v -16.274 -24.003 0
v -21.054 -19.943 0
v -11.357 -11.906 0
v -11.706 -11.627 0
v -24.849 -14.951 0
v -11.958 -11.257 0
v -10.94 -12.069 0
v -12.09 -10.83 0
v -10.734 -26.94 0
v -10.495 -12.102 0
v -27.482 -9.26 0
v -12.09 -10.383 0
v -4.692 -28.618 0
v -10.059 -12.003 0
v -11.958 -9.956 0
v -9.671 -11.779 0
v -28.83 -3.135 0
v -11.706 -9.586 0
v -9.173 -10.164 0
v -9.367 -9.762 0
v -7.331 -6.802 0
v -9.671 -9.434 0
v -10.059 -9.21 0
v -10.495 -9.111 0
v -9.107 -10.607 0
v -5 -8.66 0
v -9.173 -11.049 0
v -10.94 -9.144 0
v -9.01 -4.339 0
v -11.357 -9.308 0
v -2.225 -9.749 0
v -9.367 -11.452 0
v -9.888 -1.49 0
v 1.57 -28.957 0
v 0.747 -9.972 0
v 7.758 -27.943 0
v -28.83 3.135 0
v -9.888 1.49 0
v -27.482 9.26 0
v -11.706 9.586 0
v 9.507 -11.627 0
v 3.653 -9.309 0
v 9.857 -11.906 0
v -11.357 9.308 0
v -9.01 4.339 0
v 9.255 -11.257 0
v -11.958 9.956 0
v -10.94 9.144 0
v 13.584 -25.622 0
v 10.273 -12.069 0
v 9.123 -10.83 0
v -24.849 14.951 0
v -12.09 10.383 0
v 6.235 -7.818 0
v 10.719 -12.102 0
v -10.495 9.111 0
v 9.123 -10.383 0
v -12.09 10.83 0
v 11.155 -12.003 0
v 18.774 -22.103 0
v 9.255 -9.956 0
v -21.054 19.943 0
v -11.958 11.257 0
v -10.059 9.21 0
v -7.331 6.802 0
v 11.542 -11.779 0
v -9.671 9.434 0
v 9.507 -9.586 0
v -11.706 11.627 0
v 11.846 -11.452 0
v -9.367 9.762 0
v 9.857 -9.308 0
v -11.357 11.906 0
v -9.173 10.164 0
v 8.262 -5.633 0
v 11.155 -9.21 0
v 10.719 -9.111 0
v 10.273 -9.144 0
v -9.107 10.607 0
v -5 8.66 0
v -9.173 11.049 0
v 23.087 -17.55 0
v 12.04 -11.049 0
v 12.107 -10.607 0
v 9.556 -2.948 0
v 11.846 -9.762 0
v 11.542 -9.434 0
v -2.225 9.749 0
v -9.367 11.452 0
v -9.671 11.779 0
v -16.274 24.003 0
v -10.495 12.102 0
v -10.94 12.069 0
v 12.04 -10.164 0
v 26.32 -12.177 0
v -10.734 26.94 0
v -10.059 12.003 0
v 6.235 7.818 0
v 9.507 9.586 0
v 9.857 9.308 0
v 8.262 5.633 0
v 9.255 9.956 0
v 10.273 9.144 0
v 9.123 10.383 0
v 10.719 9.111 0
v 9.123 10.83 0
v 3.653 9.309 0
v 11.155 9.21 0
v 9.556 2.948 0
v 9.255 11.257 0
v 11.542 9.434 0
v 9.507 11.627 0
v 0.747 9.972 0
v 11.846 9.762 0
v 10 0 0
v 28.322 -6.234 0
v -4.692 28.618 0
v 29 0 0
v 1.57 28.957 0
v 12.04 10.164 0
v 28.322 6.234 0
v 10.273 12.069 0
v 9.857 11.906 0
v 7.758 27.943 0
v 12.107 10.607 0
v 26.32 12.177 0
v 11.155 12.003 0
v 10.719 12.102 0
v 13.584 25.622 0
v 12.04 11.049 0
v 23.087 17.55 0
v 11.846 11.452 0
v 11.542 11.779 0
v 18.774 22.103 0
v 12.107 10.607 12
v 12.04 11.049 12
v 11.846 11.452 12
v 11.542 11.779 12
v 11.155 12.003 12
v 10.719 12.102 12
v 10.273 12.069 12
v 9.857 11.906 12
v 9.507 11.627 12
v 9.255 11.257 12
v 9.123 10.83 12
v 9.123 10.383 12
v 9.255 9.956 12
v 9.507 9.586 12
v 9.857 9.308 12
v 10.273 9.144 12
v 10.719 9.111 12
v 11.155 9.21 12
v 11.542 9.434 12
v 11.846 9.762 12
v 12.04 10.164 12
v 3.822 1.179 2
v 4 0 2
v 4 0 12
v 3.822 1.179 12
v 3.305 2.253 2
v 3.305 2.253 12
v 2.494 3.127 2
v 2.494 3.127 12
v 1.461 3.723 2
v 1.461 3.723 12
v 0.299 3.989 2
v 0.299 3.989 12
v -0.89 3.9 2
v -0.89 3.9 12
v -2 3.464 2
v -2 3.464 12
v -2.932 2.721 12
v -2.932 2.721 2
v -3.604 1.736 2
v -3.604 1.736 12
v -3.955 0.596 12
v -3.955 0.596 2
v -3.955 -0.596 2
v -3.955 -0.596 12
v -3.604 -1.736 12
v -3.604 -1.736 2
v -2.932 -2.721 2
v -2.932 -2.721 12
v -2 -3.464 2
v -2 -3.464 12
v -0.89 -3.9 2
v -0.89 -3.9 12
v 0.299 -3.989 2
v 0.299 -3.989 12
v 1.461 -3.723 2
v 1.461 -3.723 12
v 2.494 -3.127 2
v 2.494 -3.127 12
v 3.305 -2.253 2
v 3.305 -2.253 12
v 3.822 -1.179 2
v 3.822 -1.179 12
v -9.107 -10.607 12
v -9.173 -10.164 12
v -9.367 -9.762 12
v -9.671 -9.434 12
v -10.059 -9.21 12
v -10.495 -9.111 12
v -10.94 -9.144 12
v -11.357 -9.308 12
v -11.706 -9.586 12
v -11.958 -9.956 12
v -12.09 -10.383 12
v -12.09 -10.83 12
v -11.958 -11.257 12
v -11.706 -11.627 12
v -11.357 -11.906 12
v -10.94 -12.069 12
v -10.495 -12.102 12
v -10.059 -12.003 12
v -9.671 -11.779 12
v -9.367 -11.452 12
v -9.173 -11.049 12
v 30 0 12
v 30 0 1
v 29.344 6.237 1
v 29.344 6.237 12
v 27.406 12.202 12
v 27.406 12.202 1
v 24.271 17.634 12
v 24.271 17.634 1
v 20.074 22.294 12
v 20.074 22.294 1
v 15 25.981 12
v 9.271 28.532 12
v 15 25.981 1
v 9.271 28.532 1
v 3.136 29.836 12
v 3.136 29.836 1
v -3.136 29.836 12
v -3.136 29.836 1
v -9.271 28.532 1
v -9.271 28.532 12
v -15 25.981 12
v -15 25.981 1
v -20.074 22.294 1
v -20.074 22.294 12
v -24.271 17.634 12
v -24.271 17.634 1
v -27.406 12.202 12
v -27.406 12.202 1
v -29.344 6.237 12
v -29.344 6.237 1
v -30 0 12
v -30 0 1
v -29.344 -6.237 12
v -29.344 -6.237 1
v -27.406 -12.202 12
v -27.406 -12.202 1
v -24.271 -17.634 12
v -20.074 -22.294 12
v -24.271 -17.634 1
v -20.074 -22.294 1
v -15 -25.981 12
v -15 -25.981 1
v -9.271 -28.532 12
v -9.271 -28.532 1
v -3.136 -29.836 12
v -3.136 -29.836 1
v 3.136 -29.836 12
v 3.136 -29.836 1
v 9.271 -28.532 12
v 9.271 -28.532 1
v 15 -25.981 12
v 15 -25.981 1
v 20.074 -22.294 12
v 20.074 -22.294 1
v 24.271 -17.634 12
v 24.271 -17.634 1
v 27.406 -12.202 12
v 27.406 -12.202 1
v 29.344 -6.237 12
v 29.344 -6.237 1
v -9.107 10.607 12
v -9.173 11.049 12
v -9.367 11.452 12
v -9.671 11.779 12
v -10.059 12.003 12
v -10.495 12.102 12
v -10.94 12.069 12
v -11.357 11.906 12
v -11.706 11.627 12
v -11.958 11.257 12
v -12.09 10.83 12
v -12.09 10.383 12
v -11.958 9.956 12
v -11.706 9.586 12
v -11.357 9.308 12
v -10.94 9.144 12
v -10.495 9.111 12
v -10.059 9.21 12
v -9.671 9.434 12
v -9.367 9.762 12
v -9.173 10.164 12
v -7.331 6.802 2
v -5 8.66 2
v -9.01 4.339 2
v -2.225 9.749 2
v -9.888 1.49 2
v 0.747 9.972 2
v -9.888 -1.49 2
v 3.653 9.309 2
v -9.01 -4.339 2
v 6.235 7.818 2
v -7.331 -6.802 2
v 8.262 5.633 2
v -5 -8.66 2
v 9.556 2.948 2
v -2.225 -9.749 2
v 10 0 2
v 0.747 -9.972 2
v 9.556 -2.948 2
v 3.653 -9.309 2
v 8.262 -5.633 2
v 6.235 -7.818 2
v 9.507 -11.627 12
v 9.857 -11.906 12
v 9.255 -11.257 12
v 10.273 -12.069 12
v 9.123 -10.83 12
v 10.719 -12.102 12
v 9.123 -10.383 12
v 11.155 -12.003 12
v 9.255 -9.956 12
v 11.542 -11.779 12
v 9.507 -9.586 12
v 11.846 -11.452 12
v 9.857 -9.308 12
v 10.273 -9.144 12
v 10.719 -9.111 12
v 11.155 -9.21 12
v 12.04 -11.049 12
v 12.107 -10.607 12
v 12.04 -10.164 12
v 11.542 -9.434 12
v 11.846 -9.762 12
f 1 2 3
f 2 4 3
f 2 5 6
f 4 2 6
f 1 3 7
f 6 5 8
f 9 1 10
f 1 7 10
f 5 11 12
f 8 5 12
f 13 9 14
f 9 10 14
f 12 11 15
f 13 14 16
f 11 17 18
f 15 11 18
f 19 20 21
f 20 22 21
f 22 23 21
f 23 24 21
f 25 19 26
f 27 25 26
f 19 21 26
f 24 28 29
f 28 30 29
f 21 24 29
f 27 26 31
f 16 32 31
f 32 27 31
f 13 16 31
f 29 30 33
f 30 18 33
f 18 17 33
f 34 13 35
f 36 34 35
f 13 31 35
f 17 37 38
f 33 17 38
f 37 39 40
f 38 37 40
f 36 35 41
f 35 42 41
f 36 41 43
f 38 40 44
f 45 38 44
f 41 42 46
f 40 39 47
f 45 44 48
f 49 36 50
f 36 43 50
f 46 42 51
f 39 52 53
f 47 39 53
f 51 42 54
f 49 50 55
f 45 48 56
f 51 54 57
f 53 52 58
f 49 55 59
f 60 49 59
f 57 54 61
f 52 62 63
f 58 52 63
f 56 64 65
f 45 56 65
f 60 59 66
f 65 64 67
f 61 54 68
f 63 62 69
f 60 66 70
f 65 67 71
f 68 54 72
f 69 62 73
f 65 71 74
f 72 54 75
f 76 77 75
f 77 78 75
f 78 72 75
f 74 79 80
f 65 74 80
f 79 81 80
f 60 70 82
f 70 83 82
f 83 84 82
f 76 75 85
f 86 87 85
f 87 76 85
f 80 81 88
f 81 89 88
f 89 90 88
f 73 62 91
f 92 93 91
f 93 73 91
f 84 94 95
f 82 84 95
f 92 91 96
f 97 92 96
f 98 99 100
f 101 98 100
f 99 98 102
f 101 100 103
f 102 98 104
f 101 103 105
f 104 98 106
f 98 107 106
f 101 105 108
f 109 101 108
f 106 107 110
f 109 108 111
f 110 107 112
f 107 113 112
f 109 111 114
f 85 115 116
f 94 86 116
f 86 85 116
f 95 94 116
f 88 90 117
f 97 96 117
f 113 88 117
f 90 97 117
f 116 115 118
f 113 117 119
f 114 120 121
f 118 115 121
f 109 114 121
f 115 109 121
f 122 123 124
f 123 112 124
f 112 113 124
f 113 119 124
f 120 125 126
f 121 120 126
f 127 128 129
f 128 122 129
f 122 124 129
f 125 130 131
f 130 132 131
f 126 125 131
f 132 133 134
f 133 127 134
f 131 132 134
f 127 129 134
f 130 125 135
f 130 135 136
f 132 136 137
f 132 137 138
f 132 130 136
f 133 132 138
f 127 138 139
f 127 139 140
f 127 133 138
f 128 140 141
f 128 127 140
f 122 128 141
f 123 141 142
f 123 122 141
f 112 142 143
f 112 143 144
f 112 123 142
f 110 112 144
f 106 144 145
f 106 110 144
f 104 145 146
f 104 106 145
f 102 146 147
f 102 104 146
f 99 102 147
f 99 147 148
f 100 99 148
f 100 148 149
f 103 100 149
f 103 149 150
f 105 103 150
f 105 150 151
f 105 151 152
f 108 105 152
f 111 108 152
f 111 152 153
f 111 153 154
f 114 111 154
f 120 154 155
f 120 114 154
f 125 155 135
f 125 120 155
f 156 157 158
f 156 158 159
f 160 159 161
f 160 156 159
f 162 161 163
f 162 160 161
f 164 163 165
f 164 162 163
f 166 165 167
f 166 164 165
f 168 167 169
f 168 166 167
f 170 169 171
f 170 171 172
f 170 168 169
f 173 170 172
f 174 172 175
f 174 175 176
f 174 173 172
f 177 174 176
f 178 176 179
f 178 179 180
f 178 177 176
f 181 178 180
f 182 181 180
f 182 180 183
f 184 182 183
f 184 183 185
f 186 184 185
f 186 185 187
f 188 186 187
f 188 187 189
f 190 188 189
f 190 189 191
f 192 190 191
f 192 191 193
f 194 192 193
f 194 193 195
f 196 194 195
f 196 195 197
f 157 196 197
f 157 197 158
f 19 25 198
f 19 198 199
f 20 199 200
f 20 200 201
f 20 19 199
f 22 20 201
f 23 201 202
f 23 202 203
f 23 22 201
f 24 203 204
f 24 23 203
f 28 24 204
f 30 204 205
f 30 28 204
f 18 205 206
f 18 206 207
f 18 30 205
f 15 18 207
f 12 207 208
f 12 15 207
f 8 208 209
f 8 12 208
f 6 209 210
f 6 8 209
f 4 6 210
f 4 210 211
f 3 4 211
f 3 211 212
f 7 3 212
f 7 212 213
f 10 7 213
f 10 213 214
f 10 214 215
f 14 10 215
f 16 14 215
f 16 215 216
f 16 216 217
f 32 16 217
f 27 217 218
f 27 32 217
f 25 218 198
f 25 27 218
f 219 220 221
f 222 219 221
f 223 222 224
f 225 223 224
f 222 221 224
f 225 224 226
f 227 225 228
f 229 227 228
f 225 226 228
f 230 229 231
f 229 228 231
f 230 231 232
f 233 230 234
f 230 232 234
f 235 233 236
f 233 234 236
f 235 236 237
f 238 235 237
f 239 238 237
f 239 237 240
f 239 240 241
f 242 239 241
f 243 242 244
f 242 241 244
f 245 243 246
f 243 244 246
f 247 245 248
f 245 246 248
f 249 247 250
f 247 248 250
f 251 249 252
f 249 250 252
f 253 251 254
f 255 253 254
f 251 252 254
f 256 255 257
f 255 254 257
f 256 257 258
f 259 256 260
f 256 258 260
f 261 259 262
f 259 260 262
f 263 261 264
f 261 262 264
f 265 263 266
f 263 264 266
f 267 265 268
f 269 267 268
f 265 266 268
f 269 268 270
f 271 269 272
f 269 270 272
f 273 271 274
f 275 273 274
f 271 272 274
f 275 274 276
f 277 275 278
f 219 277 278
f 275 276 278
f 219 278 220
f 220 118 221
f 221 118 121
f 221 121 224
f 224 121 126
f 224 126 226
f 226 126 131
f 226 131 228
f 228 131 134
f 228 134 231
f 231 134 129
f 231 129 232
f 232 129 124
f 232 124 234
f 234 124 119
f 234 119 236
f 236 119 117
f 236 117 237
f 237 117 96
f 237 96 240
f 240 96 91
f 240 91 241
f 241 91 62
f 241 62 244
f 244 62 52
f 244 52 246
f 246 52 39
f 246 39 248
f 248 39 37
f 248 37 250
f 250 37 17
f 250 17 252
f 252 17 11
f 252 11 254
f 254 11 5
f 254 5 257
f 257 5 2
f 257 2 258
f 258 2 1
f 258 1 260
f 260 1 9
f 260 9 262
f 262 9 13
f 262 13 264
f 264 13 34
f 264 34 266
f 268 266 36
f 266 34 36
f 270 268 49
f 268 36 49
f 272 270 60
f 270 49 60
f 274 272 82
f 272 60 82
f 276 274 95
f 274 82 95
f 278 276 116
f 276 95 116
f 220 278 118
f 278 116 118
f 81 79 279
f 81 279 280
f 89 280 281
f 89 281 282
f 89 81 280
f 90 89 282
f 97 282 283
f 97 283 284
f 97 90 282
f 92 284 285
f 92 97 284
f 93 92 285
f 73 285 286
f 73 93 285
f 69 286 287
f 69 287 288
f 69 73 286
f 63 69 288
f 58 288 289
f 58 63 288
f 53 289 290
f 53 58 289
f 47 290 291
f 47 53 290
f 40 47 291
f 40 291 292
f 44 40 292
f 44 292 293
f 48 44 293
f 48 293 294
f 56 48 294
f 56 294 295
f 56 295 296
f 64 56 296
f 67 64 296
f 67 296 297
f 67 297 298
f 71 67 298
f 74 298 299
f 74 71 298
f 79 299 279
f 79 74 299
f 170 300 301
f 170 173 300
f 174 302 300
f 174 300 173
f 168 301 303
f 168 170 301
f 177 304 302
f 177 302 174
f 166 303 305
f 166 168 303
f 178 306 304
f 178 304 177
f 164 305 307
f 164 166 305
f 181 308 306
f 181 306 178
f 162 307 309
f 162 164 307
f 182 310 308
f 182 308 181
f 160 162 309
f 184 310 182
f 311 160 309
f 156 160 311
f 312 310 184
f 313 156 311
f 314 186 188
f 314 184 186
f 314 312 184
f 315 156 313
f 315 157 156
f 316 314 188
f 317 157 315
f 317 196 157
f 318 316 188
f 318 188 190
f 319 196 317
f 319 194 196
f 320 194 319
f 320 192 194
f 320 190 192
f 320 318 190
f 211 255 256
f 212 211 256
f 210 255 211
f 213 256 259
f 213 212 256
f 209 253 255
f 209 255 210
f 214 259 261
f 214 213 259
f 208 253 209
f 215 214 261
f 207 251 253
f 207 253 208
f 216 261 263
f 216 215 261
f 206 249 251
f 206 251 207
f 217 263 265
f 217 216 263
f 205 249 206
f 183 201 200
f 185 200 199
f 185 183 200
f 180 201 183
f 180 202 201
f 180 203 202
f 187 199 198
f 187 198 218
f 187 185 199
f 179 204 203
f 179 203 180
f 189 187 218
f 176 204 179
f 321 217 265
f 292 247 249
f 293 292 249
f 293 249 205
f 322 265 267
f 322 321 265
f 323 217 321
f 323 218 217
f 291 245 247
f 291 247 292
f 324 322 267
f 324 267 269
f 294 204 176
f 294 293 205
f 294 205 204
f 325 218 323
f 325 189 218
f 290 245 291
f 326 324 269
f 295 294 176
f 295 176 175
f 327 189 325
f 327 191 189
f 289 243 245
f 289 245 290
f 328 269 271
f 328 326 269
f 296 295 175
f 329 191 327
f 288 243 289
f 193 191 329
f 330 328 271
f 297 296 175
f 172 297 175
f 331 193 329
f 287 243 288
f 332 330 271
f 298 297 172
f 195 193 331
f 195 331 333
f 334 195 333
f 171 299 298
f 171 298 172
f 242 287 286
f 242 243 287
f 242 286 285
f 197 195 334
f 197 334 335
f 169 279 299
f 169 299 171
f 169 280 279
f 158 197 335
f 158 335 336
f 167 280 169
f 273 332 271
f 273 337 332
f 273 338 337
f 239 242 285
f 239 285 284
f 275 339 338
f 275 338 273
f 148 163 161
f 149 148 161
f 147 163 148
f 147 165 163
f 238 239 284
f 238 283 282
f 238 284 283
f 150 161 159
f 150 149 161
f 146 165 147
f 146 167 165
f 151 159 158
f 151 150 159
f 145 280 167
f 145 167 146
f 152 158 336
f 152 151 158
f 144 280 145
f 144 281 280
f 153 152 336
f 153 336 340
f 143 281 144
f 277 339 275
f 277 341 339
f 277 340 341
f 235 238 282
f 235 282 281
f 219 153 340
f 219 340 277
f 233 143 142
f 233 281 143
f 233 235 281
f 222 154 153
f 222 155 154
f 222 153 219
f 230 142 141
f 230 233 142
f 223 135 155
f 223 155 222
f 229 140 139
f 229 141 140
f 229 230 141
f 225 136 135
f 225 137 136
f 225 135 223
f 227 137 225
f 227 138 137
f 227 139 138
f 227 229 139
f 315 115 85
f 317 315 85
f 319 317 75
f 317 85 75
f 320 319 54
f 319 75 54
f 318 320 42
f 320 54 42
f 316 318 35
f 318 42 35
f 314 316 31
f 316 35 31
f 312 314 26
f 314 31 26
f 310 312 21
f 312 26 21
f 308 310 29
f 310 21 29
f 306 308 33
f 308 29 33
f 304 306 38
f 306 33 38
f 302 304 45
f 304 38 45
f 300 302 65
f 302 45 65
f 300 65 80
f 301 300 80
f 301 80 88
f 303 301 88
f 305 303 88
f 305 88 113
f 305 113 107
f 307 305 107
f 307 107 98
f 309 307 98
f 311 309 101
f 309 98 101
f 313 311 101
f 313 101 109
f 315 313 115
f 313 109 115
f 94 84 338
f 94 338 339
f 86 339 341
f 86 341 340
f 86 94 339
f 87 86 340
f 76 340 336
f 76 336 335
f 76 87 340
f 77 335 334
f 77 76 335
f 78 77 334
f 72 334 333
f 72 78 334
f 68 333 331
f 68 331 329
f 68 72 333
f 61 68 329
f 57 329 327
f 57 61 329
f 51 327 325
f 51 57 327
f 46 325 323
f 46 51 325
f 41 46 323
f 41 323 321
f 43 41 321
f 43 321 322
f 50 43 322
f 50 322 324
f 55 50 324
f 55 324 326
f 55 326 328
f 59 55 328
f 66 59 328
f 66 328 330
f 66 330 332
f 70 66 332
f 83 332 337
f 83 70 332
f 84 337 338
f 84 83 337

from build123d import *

# Parameters (mm, degrees)
F0_R     = 30
F0_R_2   = 1.5
F0_R_3   = 4
F1_DEPTH = 12
F2_SIZE  = 1
F3_R     = 10
F4_DEPTH = 2


with BuildPart() as f1:
    # F0 (on Top) → F1 (new body)
    with BuildSketch(Plane.XY):
        Circle(F0_R)
        with Locations((-10.606602, -10.606602)):
            Circle(F0_R_2, mode=Mode.SUBTRACT)
        with Locations((10.606602, -10.606602)):
            Circle(F0_R_2, mode=Mode.SUBTRACT)
        with Locations((-10.606602, 10.606602)):
            Circle(F0_R_2, mode=Mode.SUBTRACT)
        Circle(F0_R_3, mode=Mode.SUBTRACT)
        with Locations((10.606602, 10.606602)):
            Circle(F0_R_2, mode=Mode.SUBTRACT)
    extrude(amount=F1_DEPTH)

    # F2
    f2_edges = [f1.edges().sort_by_distance(p)[0] for p in [
        (-30, 0, 0),
    ]]
    chamfer(f2_edges, length=F2_SIZE)

    # F3 (on face) → F4 (cut)
    with BuildSketch(Plane(origin=(0, 0, 0), x_dir=(1, 0, 0), z_dir=(0, 0, -1))):
        Circle(F3_R)
    extrude(amount=-F4_DEPTH, mode=Mode.SUBTRACT)


solid = f1.part
